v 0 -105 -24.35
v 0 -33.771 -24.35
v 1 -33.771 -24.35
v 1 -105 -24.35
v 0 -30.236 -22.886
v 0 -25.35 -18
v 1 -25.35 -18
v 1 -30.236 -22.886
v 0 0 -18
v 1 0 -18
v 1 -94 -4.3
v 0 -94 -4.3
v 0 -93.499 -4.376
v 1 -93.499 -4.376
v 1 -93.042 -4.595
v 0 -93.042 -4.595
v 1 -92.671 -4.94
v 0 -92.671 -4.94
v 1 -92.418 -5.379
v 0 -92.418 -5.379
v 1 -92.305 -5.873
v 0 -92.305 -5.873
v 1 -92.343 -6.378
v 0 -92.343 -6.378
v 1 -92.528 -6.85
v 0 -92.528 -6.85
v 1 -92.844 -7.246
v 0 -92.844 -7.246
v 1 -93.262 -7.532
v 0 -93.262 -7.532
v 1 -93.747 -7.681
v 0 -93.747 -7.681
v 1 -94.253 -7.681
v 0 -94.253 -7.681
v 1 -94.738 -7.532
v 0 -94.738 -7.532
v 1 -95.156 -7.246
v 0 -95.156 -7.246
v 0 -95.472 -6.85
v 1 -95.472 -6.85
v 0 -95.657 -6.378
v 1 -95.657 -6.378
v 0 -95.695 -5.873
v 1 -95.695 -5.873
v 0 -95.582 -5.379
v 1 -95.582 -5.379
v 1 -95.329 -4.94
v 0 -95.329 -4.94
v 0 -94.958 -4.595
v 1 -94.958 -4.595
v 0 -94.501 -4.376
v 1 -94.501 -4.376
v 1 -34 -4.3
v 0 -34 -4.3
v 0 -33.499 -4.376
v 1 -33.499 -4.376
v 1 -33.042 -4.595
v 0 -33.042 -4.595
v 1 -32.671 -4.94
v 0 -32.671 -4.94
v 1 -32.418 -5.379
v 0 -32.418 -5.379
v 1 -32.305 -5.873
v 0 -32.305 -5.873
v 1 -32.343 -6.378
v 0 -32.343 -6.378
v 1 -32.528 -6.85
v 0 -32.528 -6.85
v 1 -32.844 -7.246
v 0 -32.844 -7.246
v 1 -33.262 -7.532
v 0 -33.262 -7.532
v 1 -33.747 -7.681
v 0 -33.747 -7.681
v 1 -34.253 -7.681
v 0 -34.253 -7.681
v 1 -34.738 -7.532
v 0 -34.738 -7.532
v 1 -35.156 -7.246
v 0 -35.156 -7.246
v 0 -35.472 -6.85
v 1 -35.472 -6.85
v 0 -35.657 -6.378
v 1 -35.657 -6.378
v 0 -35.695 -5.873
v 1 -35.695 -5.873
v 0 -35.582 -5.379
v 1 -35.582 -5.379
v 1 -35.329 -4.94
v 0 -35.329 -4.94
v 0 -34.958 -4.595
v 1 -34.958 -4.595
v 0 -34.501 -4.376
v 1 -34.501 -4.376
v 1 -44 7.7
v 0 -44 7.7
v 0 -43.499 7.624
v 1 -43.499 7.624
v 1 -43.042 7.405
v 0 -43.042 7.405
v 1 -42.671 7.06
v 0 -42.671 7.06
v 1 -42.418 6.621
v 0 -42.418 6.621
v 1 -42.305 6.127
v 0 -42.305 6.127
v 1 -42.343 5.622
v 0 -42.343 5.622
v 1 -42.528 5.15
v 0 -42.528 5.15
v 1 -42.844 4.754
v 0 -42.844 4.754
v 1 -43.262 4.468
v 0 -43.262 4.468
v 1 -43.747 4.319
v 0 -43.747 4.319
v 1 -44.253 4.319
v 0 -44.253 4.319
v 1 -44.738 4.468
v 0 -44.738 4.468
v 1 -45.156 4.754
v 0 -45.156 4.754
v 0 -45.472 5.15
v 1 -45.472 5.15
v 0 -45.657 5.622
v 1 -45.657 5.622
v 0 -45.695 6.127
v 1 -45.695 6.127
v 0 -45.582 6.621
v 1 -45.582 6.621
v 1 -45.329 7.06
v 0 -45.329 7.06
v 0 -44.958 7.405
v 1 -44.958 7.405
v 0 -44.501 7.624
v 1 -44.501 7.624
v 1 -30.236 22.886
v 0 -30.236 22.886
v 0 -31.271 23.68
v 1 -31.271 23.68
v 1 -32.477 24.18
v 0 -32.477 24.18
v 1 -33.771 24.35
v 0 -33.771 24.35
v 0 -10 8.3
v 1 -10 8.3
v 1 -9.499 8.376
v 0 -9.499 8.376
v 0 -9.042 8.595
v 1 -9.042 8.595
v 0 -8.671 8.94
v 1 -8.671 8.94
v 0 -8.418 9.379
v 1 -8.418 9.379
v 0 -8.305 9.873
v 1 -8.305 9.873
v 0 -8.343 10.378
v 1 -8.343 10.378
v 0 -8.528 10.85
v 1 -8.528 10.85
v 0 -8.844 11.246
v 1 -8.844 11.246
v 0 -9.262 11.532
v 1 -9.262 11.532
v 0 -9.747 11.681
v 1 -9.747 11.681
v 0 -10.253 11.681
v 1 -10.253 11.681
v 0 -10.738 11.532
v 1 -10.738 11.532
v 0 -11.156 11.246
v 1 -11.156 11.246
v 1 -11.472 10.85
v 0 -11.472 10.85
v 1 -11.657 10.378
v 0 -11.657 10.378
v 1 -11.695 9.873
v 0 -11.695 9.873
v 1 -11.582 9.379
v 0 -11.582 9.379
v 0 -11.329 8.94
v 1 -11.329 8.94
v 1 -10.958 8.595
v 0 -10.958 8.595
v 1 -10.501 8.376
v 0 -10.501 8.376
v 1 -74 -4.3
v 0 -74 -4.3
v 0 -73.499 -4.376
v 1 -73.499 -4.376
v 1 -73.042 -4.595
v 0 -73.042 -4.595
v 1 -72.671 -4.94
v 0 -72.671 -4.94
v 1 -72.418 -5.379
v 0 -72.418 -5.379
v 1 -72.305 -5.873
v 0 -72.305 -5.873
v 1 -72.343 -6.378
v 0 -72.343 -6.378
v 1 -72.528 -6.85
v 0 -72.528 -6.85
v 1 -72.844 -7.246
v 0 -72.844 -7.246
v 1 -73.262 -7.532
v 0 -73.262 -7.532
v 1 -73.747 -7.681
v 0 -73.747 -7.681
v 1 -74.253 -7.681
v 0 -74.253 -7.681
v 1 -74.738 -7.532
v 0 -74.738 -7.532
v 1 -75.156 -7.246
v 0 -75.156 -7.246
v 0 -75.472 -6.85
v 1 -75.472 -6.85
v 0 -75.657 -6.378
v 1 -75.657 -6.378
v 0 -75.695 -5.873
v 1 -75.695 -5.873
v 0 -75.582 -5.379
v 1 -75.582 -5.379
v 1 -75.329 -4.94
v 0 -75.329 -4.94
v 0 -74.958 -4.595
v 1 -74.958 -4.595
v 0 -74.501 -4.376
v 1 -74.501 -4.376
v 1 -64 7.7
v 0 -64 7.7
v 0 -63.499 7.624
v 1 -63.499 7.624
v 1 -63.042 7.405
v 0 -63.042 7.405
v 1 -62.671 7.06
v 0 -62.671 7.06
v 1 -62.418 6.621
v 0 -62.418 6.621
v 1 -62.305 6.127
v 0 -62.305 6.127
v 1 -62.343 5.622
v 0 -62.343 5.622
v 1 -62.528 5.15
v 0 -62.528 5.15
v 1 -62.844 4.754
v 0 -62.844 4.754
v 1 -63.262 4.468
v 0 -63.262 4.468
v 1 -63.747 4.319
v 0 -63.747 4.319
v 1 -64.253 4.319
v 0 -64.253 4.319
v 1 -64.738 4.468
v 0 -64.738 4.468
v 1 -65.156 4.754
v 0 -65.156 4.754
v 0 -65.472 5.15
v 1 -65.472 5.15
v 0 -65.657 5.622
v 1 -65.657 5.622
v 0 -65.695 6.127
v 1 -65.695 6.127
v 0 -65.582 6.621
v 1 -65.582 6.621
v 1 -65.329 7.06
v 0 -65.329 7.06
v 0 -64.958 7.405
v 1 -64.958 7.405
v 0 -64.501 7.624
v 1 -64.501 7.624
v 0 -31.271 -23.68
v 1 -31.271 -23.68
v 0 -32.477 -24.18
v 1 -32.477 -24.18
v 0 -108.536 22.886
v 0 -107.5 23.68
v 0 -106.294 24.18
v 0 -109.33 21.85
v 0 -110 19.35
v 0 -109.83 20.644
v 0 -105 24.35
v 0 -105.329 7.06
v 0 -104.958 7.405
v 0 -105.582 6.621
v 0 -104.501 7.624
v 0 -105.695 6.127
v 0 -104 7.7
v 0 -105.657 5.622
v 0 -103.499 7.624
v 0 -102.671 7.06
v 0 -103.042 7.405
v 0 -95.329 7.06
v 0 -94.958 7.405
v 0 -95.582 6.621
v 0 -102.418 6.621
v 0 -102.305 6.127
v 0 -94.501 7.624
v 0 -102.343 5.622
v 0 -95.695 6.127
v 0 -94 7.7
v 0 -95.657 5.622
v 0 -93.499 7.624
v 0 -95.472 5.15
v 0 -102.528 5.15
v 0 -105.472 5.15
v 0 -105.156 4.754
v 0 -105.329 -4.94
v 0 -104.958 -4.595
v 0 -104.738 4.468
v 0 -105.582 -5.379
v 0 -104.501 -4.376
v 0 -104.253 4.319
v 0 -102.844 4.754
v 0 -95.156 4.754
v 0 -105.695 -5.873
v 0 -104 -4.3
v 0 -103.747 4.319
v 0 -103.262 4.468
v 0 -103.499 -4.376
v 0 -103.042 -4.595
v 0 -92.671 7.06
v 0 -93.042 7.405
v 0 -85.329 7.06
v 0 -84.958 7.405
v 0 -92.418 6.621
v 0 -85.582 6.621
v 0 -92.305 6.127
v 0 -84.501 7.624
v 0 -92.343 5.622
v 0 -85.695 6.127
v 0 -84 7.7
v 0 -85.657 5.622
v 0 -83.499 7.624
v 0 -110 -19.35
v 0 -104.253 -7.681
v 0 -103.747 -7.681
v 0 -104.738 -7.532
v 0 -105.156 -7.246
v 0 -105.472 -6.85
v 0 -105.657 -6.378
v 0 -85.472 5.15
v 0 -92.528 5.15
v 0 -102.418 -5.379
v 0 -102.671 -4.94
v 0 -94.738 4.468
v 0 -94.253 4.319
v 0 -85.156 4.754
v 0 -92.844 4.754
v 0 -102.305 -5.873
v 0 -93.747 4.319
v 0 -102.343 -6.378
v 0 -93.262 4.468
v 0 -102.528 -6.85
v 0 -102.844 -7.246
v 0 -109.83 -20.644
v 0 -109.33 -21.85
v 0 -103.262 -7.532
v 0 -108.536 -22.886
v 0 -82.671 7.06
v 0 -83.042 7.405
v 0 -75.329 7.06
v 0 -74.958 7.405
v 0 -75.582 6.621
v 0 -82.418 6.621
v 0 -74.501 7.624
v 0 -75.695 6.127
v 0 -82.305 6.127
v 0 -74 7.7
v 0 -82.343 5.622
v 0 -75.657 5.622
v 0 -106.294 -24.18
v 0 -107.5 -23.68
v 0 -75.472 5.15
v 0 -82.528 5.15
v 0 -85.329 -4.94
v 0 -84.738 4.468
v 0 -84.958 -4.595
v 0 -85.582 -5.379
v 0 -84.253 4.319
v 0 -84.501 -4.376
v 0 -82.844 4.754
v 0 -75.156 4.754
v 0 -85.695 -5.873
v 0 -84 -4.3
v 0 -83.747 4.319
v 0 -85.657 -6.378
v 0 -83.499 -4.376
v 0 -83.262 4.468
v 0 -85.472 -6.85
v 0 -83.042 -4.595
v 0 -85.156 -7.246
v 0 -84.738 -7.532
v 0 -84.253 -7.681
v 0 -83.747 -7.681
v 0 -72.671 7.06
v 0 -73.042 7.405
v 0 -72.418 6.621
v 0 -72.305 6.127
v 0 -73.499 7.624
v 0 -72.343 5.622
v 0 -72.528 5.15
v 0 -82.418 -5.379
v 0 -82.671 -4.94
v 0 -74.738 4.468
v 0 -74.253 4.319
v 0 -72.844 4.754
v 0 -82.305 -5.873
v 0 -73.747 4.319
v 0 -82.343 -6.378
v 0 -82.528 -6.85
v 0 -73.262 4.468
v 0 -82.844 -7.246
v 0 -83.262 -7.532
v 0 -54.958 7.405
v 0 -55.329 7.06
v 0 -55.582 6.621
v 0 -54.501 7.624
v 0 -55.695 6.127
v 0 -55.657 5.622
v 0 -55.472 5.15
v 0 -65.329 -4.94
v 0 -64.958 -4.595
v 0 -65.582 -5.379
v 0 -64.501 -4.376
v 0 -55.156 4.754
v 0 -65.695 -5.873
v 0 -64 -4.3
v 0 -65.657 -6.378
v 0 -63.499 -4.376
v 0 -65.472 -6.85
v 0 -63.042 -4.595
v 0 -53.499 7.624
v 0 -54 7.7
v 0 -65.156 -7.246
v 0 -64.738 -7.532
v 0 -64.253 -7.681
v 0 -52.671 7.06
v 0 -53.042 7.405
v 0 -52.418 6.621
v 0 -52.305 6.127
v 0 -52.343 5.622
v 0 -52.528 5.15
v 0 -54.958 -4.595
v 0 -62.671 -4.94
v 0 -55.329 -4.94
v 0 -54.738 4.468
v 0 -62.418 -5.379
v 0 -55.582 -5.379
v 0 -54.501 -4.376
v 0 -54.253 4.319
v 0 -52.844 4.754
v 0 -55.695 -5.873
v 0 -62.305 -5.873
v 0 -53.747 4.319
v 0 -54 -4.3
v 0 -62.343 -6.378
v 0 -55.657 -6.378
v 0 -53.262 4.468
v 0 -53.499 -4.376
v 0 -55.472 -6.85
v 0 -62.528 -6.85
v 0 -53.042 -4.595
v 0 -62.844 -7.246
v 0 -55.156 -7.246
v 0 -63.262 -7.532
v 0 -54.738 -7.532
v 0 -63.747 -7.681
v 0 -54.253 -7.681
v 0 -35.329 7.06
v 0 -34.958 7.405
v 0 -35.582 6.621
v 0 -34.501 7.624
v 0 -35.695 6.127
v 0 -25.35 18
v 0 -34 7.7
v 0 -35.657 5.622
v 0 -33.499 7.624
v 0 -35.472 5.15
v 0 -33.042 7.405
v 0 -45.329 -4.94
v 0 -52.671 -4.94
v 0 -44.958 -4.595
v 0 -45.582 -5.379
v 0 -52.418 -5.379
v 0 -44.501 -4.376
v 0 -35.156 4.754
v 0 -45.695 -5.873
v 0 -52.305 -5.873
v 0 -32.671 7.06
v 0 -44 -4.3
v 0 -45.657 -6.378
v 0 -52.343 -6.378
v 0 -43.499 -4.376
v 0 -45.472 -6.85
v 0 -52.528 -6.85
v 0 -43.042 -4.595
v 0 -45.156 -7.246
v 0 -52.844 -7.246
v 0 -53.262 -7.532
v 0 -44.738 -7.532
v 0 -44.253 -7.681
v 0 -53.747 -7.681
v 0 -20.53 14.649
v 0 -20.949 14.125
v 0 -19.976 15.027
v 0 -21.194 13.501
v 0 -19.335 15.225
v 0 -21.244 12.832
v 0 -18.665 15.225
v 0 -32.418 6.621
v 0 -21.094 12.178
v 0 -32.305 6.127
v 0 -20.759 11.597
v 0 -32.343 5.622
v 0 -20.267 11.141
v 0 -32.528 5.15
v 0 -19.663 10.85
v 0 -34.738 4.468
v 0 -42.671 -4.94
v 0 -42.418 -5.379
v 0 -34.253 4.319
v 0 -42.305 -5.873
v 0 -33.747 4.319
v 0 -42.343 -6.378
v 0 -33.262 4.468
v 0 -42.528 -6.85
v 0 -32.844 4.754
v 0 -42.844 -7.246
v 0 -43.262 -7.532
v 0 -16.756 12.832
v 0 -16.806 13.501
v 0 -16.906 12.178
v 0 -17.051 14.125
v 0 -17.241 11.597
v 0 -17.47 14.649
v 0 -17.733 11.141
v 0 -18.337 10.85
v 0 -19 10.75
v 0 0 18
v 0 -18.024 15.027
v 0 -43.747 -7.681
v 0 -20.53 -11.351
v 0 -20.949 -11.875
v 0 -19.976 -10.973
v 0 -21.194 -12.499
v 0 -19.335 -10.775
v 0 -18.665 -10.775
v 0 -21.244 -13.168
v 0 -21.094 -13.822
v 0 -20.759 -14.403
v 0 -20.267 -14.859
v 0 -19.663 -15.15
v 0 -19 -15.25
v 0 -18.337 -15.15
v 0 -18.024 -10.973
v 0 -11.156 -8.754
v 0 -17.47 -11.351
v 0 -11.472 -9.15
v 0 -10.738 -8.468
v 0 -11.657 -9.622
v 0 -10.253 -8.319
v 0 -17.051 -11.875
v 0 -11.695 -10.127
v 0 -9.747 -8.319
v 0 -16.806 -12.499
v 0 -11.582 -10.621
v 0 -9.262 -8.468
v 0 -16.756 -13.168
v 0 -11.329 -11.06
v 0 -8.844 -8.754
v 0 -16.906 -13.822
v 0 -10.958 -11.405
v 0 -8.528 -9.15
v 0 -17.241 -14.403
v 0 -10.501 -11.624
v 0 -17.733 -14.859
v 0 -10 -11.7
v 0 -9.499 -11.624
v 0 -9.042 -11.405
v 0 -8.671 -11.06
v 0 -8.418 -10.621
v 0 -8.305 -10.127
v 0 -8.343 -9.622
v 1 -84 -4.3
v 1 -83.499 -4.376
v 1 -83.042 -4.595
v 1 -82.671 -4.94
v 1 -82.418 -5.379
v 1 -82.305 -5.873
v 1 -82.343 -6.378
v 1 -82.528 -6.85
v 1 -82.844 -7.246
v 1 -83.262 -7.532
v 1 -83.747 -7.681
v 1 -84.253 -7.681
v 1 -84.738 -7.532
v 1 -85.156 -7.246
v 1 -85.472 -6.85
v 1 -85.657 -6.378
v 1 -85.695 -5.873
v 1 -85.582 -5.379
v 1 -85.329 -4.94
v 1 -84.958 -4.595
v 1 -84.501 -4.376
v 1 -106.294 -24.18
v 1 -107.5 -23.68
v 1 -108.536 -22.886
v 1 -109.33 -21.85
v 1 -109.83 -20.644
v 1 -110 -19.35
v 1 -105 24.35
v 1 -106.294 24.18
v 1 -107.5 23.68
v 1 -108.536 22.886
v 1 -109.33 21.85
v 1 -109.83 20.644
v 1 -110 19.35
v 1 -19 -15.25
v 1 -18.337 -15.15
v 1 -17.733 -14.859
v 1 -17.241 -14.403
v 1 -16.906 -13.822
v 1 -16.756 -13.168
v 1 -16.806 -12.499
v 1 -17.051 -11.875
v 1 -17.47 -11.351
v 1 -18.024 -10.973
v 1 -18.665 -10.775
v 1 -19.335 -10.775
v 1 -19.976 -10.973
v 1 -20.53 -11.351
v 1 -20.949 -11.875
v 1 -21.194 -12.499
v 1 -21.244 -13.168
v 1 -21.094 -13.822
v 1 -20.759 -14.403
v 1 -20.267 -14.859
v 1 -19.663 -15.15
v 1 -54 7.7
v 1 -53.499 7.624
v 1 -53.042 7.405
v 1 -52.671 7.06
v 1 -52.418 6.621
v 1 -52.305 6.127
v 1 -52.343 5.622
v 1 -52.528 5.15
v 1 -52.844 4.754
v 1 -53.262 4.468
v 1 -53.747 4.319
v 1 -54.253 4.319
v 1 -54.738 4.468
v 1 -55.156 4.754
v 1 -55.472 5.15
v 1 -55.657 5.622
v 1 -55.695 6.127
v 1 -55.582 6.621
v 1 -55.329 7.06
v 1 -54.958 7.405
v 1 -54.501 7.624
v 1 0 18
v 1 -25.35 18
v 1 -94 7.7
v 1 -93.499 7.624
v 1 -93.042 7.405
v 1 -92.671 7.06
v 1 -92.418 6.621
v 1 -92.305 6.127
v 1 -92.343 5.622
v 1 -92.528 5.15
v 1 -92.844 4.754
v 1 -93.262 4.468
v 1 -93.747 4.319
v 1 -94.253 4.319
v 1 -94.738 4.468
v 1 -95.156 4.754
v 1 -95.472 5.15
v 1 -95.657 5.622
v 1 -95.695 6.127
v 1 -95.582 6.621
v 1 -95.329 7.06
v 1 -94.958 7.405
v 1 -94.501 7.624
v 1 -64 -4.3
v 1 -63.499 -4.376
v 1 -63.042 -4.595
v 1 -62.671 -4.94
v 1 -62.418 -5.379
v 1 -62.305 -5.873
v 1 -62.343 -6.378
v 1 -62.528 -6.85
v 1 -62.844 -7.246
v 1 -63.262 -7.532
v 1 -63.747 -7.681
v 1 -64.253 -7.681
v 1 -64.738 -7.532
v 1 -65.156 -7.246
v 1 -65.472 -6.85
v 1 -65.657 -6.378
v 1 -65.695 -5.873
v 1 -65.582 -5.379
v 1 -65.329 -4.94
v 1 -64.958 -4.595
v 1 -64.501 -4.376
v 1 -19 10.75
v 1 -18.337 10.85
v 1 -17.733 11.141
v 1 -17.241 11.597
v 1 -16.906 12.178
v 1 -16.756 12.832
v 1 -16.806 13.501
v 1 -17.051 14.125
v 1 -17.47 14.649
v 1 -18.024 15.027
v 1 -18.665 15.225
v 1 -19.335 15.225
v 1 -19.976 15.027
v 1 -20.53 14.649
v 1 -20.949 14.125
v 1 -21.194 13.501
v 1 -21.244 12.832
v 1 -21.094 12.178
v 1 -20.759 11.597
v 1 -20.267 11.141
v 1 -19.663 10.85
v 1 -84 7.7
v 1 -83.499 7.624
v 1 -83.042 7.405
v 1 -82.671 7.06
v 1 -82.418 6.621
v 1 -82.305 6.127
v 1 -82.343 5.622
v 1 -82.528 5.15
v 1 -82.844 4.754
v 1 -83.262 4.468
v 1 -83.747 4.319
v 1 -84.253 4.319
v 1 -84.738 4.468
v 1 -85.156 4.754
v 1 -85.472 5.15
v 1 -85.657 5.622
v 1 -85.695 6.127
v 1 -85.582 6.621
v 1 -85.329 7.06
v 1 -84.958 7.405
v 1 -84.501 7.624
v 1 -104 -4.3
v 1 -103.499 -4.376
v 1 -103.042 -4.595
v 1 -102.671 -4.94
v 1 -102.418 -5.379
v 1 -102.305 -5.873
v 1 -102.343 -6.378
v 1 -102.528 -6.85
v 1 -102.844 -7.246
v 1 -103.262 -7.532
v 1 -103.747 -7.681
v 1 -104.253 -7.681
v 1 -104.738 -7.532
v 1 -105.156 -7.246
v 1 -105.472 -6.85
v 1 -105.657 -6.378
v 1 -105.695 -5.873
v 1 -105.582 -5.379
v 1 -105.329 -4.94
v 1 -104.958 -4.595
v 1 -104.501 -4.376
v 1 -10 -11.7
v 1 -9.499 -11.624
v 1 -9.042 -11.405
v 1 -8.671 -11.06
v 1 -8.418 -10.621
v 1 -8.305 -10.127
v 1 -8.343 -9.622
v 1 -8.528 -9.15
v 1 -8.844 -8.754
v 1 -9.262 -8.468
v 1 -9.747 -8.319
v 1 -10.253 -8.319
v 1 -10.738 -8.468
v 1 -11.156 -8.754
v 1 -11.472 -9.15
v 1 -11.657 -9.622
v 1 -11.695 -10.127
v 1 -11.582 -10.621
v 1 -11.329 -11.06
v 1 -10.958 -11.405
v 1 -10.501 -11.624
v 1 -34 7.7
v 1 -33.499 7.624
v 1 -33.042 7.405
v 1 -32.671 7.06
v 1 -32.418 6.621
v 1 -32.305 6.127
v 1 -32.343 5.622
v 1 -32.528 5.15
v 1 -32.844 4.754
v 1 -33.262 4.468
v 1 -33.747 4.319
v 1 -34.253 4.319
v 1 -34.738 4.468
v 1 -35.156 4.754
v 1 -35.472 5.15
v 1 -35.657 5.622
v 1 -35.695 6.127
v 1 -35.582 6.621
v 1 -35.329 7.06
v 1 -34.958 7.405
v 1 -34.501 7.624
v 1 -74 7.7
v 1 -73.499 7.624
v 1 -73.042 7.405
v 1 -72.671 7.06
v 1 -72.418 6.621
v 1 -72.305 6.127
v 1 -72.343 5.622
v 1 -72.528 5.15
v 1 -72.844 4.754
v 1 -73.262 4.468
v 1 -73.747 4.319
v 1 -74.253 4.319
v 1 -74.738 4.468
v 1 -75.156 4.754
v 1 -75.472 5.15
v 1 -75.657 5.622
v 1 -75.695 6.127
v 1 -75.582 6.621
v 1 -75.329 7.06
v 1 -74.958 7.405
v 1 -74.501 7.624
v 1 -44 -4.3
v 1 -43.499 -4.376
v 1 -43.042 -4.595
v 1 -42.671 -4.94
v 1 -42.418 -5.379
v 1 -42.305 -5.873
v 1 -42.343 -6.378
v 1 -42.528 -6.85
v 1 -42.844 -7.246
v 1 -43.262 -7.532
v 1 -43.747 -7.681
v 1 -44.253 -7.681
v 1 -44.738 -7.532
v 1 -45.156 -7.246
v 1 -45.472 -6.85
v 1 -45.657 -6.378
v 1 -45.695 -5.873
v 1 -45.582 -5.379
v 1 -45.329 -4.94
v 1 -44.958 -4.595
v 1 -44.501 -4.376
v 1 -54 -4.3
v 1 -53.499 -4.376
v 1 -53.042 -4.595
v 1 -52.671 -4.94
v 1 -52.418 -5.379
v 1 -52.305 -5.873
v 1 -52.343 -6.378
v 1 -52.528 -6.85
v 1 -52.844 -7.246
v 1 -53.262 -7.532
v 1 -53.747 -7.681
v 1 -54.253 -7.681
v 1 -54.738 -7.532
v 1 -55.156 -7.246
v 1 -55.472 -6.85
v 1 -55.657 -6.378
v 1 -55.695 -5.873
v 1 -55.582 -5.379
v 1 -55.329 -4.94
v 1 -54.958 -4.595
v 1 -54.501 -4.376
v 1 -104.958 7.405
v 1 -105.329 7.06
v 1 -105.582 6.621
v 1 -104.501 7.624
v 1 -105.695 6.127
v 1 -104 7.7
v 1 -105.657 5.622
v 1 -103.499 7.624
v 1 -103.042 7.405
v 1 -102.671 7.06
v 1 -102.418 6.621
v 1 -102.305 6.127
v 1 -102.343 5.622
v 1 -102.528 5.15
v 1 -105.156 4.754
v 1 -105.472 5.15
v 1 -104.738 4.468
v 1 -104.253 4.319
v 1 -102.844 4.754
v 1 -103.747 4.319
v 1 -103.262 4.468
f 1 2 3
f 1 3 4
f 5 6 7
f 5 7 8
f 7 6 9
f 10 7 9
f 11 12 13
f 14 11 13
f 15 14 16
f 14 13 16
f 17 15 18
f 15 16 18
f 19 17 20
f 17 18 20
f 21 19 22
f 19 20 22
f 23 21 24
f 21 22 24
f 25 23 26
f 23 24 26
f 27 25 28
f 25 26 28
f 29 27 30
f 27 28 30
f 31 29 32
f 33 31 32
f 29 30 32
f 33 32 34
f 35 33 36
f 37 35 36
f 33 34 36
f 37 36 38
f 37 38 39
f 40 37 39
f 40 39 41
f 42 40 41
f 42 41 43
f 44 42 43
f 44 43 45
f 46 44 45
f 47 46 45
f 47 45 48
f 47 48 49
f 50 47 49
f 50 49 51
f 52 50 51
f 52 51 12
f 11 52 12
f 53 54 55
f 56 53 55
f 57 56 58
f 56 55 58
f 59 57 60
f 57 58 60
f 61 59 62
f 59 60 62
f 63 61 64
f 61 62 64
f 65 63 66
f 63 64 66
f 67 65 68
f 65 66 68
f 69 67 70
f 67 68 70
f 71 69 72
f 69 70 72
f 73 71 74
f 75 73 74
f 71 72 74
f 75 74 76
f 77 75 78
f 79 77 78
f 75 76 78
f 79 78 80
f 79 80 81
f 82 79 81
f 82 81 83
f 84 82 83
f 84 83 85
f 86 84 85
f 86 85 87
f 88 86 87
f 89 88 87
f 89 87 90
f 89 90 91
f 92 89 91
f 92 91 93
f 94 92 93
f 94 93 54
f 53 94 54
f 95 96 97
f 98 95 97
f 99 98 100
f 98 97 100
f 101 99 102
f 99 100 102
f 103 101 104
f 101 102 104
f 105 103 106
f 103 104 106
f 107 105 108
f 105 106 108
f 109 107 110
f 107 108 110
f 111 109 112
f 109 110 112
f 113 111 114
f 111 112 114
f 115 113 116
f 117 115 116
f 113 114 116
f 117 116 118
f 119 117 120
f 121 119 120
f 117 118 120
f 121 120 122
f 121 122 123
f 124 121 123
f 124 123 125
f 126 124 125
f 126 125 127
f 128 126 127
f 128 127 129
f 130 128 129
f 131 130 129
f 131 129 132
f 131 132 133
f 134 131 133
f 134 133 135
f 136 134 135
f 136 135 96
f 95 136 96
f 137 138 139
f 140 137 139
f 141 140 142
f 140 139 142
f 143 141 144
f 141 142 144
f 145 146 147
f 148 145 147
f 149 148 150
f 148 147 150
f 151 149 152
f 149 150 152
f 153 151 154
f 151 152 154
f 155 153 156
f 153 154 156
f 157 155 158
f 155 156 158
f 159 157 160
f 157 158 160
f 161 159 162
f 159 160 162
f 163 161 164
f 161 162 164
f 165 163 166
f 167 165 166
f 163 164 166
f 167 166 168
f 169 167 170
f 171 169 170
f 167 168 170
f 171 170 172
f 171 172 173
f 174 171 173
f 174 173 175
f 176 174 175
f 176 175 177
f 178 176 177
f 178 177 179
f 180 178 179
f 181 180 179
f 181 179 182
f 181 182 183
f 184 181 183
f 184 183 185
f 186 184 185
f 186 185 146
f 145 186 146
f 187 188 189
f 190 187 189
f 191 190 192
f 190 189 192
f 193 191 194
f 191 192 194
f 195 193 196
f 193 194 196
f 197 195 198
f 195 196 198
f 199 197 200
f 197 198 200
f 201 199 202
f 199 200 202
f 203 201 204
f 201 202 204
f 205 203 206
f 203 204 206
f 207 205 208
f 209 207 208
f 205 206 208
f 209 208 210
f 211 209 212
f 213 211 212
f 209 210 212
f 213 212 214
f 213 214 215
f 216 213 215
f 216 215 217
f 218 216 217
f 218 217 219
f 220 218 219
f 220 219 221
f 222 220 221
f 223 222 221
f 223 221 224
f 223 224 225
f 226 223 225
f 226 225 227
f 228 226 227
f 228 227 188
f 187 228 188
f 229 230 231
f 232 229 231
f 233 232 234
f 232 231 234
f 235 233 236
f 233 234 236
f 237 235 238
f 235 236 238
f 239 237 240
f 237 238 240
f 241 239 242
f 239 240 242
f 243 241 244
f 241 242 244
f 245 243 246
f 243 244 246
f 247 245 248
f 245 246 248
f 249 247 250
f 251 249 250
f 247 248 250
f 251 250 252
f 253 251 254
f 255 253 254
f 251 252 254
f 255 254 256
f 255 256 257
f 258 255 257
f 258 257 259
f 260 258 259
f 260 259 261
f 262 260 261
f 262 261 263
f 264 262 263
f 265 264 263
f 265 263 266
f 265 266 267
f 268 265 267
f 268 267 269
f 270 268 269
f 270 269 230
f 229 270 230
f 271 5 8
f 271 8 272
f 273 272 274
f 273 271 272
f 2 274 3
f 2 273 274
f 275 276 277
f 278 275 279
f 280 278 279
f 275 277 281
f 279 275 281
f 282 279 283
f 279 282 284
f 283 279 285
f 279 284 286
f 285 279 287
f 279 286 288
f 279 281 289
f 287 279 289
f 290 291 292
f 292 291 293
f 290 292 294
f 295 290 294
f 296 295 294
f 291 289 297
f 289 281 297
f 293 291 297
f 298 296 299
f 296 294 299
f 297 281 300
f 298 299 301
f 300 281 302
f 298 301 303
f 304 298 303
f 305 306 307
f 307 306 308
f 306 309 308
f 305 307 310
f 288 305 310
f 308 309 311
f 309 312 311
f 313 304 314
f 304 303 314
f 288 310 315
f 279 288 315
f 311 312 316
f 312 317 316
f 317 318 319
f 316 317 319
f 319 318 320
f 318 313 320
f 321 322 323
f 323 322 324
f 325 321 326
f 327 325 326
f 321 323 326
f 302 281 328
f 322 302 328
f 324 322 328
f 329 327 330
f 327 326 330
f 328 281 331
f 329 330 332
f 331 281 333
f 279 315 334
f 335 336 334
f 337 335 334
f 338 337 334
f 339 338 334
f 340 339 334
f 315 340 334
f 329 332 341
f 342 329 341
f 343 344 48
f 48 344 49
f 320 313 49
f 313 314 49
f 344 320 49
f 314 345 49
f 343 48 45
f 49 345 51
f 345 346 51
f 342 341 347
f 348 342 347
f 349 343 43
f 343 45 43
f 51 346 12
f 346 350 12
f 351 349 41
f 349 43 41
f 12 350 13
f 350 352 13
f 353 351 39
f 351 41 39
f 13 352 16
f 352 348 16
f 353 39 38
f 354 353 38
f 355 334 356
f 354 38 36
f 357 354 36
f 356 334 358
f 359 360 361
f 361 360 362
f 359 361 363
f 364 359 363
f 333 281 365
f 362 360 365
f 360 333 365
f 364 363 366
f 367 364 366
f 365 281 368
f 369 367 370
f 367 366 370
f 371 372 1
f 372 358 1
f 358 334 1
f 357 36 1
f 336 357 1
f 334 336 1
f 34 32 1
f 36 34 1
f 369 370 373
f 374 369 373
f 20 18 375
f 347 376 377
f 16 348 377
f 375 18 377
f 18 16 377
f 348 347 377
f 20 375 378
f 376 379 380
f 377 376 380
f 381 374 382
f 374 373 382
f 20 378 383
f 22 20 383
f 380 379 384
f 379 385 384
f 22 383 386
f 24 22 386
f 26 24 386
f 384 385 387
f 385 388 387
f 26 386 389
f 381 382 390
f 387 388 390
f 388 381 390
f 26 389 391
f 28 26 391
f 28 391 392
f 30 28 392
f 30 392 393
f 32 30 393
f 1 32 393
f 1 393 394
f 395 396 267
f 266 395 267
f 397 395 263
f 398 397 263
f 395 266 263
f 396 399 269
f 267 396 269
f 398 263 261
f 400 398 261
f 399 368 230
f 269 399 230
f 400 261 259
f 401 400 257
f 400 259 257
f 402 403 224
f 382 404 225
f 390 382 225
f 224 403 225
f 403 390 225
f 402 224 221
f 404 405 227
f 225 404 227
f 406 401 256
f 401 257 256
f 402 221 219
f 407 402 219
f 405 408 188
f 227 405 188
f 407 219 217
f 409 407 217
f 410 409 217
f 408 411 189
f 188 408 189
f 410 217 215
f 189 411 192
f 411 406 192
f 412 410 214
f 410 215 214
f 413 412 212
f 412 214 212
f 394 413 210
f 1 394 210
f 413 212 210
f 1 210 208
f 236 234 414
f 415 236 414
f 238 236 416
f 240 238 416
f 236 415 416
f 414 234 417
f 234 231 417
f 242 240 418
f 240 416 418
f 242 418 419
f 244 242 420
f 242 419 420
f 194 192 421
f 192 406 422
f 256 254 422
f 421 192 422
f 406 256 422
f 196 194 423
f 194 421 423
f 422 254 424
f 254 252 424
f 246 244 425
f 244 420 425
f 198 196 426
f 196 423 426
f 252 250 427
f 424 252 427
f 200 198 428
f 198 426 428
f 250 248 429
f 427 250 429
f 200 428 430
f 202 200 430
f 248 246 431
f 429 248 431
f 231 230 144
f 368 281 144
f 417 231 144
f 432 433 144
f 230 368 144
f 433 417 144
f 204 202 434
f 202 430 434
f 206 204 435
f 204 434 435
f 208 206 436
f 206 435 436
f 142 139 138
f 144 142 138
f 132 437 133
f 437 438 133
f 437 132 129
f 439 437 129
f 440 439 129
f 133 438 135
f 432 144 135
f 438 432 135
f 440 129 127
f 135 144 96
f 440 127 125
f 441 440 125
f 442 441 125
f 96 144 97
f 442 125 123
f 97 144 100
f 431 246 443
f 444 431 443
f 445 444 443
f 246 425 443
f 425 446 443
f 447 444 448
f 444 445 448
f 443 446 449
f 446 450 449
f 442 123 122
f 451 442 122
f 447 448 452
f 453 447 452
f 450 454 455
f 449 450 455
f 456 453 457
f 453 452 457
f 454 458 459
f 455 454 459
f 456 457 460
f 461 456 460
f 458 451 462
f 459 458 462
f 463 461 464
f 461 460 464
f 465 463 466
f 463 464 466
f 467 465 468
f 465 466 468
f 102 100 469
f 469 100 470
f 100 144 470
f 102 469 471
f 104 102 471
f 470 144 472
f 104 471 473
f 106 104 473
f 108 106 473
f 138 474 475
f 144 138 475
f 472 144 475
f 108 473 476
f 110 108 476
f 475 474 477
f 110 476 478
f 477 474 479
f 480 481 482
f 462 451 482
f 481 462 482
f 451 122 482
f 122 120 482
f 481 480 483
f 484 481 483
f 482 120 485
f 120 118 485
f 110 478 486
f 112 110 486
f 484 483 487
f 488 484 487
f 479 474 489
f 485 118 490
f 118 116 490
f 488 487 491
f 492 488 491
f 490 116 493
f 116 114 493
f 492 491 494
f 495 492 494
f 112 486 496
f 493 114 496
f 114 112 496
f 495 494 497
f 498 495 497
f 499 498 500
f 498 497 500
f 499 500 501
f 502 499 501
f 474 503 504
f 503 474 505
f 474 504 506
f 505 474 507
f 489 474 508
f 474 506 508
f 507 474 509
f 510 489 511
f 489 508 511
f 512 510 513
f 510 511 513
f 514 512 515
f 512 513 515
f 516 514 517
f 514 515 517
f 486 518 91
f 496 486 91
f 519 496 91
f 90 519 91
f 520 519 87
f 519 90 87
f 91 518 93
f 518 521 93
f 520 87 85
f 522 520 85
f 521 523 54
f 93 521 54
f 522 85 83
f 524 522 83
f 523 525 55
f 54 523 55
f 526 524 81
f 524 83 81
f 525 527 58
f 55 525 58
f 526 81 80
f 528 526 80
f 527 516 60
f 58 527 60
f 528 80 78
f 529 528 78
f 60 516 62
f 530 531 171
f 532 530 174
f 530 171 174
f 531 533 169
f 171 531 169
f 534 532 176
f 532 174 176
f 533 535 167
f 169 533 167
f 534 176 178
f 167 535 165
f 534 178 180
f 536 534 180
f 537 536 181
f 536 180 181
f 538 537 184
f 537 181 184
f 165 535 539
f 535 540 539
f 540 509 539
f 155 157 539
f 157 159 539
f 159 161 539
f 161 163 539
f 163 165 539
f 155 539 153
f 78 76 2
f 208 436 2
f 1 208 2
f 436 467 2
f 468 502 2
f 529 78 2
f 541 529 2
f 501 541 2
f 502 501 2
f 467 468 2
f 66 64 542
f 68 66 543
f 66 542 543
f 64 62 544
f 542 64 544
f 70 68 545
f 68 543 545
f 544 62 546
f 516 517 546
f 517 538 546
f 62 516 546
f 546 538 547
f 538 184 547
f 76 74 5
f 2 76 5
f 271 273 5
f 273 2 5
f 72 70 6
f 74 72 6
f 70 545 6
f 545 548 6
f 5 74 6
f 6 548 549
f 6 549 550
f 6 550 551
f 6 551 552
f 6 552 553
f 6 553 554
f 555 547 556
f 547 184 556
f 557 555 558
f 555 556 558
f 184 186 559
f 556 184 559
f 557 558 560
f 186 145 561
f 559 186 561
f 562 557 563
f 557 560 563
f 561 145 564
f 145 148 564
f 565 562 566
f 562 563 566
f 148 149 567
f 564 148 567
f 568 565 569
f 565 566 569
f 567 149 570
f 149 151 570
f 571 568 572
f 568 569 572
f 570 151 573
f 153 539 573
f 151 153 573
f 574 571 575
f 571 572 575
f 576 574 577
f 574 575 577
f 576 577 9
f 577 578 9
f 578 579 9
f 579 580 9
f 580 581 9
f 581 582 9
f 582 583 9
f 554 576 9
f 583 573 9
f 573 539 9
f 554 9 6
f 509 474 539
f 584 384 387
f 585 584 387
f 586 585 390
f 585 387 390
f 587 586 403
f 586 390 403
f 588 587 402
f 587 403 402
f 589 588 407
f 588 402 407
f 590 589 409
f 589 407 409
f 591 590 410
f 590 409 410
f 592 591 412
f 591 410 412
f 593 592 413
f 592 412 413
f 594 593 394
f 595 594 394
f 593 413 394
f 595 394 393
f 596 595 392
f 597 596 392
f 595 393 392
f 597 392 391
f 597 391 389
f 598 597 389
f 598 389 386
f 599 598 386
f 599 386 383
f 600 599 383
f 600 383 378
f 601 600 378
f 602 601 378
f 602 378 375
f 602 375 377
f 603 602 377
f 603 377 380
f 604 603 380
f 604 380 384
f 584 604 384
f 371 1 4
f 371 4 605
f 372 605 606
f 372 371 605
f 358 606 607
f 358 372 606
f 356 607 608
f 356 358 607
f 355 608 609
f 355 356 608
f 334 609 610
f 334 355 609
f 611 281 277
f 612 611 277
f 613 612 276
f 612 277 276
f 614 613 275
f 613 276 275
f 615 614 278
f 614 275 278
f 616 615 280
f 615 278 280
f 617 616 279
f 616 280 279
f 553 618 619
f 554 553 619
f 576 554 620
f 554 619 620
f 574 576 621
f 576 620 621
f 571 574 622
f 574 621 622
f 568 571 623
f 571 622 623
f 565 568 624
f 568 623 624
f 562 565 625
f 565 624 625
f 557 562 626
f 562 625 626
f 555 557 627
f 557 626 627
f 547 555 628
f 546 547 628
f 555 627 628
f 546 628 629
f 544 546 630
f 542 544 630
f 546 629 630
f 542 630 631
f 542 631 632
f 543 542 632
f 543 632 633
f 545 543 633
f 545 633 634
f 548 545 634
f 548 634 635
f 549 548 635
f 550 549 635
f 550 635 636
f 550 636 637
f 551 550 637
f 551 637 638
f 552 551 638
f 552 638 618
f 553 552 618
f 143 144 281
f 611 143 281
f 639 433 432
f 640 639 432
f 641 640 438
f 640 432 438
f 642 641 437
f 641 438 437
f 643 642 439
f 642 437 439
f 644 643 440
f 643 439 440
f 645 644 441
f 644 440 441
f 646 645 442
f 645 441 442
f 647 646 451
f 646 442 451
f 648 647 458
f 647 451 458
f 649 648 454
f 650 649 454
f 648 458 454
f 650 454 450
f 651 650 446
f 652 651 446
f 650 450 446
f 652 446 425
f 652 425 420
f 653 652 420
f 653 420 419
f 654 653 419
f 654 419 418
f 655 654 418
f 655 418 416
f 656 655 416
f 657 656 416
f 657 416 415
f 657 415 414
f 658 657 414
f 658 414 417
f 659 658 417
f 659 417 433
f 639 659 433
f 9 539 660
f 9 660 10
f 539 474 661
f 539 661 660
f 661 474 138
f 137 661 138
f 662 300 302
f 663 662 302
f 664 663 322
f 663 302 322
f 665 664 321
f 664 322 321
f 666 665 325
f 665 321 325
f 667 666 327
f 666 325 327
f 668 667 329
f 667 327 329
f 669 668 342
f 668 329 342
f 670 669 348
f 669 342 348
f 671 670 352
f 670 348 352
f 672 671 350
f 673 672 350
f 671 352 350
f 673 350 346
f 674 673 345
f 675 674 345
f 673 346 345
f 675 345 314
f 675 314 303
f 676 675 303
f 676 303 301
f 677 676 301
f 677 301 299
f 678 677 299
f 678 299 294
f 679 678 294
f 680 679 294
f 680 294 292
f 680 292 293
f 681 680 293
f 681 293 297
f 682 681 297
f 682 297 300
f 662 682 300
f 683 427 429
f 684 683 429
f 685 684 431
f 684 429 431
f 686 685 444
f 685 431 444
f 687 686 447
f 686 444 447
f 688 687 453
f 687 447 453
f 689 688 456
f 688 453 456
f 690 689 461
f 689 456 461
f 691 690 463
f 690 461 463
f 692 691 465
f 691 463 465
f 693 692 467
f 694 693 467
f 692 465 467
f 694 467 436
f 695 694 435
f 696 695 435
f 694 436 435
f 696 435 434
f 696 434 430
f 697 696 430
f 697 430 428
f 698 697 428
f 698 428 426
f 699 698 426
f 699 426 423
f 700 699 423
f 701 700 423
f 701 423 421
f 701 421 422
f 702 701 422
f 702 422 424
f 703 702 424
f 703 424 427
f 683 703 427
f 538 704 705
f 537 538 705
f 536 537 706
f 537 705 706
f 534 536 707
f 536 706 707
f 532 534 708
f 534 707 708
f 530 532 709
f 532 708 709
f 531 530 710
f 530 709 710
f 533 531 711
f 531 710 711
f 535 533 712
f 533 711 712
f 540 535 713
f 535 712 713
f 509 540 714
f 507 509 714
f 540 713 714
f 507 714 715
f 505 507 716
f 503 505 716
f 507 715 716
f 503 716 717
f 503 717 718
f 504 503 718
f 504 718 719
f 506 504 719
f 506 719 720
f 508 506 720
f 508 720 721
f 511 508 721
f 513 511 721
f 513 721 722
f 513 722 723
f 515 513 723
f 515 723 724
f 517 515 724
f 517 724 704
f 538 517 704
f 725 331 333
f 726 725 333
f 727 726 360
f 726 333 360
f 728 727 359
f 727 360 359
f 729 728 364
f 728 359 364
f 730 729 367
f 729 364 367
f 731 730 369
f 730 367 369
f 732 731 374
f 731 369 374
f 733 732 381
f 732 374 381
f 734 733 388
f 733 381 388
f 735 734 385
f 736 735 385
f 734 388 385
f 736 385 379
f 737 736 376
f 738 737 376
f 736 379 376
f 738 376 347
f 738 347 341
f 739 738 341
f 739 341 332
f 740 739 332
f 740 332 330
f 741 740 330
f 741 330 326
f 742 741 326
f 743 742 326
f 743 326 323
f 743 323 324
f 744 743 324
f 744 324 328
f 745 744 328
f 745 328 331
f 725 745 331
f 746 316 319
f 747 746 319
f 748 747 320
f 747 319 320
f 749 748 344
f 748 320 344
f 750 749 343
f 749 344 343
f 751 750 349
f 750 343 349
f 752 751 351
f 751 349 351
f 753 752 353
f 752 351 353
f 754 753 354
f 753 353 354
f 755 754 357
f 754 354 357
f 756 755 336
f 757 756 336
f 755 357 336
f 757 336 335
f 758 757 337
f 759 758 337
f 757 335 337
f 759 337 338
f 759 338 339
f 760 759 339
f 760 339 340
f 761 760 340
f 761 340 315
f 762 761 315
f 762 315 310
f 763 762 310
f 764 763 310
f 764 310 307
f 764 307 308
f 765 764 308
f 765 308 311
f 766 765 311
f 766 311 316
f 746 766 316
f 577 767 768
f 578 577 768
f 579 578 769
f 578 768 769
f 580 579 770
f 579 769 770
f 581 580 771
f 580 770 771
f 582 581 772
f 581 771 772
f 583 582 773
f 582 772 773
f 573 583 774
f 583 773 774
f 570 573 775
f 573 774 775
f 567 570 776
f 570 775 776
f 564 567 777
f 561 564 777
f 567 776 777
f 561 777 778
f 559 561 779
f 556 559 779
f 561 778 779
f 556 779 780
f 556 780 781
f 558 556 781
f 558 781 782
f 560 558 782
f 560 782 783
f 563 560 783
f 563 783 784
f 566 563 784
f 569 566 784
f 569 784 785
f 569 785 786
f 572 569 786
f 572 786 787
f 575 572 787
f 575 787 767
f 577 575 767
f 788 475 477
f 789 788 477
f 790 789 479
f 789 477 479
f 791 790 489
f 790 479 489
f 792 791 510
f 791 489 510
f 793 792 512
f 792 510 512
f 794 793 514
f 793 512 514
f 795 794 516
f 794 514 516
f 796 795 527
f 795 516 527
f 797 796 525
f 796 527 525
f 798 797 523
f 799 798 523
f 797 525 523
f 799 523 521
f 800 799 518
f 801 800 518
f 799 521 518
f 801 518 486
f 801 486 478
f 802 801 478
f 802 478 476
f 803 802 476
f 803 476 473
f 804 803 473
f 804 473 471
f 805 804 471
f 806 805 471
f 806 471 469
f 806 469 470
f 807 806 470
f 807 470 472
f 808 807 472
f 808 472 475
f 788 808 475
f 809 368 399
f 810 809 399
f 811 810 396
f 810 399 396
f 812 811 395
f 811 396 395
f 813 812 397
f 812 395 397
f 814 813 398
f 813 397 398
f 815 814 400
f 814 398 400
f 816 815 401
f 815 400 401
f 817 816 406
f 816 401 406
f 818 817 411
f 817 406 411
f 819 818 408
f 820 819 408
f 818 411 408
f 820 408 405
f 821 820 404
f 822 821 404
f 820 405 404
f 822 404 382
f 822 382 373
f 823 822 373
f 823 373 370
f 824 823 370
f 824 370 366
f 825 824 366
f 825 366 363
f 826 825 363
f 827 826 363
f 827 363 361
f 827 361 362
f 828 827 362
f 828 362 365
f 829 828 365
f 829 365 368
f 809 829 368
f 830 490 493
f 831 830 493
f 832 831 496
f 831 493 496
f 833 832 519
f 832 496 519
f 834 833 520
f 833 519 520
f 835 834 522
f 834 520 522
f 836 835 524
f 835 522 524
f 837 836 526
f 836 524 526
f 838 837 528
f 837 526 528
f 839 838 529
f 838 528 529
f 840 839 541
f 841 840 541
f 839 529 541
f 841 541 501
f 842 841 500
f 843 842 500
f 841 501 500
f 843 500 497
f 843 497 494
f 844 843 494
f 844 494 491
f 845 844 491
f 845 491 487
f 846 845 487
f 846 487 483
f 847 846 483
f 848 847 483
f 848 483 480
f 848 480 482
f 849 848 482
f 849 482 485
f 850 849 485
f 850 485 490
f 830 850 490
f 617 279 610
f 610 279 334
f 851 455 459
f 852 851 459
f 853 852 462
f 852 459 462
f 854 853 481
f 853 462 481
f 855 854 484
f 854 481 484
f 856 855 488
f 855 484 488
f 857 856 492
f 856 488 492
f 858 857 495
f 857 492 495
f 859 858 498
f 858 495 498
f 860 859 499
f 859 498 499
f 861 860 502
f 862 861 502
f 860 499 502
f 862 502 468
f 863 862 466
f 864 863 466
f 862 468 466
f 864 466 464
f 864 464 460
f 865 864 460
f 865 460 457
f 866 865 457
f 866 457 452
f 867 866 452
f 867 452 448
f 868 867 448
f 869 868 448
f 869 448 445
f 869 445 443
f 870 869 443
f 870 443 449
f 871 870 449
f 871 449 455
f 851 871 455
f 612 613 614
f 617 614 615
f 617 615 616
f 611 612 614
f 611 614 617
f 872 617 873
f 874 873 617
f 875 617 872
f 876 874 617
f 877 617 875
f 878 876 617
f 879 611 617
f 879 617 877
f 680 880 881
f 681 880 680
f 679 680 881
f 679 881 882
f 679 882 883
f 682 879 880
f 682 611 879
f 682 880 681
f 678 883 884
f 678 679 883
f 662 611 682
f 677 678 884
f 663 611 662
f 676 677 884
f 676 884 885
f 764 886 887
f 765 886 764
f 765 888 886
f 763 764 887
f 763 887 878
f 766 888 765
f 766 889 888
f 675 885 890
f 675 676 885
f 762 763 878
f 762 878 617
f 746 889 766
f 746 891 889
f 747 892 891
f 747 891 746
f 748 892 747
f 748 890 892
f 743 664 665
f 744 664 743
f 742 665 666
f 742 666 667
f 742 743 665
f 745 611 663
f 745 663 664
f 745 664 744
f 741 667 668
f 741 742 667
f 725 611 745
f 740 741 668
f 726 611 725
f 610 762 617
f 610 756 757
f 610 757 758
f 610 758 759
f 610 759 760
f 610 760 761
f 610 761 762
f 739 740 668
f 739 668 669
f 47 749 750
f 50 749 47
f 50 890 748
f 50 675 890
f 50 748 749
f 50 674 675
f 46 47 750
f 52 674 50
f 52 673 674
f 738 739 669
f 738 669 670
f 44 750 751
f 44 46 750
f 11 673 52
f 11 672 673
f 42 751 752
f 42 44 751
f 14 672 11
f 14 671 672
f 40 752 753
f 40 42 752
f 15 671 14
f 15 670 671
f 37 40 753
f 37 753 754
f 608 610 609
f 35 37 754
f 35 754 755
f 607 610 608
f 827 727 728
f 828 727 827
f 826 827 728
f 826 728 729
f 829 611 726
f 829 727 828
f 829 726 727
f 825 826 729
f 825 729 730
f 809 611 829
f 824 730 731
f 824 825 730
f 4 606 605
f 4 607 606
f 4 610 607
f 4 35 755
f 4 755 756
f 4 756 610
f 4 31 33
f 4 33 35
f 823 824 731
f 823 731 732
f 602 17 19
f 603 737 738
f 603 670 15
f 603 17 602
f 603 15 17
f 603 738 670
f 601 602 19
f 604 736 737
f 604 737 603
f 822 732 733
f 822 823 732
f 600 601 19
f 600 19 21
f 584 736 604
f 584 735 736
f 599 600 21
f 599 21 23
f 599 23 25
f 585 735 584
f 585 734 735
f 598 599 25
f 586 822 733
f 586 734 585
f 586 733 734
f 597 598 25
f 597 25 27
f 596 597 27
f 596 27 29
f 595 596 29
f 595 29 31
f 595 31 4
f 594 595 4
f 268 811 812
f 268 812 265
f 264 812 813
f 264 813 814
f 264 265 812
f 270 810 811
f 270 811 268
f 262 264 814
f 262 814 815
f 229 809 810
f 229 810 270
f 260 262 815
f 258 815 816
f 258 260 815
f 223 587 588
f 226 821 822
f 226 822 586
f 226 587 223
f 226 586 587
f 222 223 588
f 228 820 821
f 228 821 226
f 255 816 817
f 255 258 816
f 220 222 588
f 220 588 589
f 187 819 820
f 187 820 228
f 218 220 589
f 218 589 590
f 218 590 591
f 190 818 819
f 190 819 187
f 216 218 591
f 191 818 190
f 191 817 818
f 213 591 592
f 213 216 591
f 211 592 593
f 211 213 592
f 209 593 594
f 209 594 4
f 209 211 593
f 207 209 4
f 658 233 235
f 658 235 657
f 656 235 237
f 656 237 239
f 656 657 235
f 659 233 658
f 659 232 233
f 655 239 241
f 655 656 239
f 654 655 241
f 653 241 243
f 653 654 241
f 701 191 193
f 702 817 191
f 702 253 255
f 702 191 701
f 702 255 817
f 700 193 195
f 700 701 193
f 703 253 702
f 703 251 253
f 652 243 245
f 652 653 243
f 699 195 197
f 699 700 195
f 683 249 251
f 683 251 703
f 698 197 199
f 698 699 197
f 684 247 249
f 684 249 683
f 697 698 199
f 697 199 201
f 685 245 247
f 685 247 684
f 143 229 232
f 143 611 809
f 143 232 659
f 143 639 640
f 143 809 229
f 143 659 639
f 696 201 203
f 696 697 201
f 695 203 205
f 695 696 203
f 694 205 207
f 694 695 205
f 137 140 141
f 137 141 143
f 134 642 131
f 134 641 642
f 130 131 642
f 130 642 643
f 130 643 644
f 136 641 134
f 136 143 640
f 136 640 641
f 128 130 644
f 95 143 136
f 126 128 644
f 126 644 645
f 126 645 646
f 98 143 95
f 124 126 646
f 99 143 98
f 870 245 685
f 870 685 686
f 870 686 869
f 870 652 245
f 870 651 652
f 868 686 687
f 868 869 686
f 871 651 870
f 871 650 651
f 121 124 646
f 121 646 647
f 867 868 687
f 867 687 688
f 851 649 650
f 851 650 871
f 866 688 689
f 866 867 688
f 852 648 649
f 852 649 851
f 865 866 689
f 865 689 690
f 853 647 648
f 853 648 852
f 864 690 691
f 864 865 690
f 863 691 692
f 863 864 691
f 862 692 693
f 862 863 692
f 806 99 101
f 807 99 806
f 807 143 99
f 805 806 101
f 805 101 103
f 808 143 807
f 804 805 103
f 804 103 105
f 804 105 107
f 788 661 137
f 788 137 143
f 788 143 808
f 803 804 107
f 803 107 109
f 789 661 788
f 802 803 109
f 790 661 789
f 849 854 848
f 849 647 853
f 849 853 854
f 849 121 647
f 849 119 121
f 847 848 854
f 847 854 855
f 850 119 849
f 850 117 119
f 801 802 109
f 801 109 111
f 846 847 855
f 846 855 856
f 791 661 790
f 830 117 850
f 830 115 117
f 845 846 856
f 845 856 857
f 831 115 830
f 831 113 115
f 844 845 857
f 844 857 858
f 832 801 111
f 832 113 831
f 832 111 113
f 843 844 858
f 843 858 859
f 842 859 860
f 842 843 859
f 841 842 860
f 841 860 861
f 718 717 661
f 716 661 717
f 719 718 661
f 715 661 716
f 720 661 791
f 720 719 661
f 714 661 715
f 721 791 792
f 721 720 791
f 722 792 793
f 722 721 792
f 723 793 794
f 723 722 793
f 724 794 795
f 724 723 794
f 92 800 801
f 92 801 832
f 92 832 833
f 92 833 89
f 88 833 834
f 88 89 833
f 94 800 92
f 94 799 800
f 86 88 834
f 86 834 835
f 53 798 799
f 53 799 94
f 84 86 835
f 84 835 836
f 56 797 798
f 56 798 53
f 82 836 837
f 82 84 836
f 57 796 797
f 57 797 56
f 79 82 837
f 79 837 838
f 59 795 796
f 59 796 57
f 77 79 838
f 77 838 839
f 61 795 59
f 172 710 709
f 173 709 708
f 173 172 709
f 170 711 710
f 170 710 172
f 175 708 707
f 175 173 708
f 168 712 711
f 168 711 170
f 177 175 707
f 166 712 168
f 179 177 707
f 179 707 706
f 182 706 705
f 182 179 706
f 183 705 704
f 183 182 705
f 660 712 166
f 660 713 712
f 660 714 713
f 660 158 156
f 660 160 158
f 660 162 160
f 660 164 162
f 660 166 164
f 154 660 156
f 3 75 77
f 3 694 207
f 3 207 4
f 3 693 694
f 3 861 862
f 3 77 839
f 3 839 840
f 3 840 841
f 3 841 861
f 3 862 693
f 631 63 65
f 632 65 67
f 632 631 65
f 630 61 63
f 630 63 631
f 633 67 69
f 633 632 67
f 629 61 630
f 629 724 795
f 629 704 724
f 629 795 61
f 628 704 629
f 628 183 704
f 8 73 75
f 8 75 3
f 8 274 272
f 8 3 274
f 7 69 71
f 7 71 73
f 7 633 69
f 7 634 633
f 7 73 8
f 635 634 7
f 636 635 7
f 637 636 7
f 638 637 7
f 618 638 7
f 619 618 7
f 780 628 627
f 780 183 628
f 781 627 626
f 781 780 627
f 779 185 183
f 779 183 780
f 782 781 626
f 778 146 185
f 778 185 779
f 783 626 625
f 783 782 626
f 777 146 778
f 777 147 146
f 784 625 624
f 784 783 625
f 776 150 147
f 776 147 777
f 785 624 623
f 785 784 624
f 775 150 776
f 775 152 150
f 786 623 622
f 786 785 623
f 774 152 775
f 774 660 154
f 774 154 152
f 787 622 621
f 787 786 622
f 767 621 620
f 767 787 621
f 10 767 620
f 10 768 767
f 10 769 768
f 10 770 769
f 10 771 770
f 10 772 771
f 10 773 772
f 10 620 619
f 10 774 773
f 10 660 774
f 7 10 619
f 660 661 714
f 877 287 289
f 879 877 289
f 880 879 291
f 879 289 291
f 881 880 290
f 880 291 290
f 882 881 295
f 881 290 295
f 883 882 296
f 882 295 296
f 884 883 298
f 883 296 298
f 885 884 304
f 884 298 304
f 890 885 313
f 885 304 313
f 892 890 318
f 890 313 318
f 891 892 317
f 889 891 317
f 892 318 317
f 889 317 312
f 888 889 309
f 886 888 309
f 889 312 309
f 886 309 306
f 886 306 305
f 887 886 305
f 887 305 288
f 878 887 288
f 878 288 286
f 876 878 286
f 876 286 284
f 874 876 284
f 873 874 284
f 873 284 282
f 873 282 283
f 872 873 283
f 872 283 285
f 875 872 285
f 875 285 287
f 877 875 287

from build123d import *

# Parameters (mm, degrees)
SKETCH1_W            = 36
SKETCH1_H            = 110
BOSS_EXTRUDE1_DEPTH  = 1
M3_CLEARANCE_HOLE1_D = 3.4
M4_CLEARANCE_HOLE1_D = 4.5
M3_CLEARANCE_HOLE2_D = 3.4
BOSS_EXTRUDE2_DEPTH  = 1


with BuildPart() as part:
    # Sketch1 → Boss-Extrude1 (new body)
    with BuildSketch(Plane(origin=(0, 0, 0), x_dir=(0, 0, -1), z_dir=(1, 0, 0))):
        with Locations((0, -55)):
            Rectangle(SKETCH1_W, SKETCH1_H)
    extrude(amount=BOSS_EXTRUDE1_DEPTH)

    # M3 Clearance Hole1 (through all)
    with Locations(Plane.ZY):
        with Locations((-10, -10), (10, -10)):
            Hole(M3_CLEARANCE_HOLE1_D / 2)

    # M4 Clearance Hole1 (through all)
    with Locations(Plane.ZY):
        with Locations((-13, -19), (13, -19)):
            Hole(M4_CLEARANCE_HOLE1_D / 2)

    # M3 Clearance Hole2 (through all)
    with Locations(Plane(origin=(1, 0, 0), x_dir=(0, 0, -1), z_dir=(1, 0, 0))):
        with Locations((6, -104), (-6, -104), (6, -94), (-6, -94), (6, -84), (-6, -84), (6, -74), (-6, -74), (6, -64), (-6, -64), (6, -54), (-6, -54), (6, -44), (-6, -44), (6, -34), (-6, -34)):
            Hole(M3_CLEARANCE_HOLE2_D / 2)

    # Sketch9 → Boss-Extrude2 (add)
    with BuildSketch(Plane.ZY):
        with BuildLine():
            Line((18, -25.35), (22.885533906, -30.235533906))
            ThreePointArc((22.885533906, -30.235533906), (23.969397663, -31.85765065), (24.35, -33.771067812))
            Line((24.35, -33.771067812), (24.35, -105))
            ThreePointArc((24.35, -105), (22.885533906, -108.535533906), (19.35, -110))
            Line((19.35, -110), (18, -110))
            Line((18, -110), (18, -25.35))
        make_face()
        with BuildLine():
            Line((-18, -25.35), (-22.885533906, -30.235533906))
            ThreePointArc((-22.885533906, -30.235533906), (-23.969397663, -31.85765065), (-24.35, -33.771067812))
            Line((-24.35, -33.771067812), (-24.35, -105))
            ThreePointArc((-24.35, -105), (-22.885533906, -108.535533906), (-19.35, -110))
            Line((-19.35, -110), (-18, -110))
            Line((-18, -110), (-18, -25.35))
        make_face()
    extrude(amount=-BOSS_EXTRUDE2_DEPTH)


solid = part.part
